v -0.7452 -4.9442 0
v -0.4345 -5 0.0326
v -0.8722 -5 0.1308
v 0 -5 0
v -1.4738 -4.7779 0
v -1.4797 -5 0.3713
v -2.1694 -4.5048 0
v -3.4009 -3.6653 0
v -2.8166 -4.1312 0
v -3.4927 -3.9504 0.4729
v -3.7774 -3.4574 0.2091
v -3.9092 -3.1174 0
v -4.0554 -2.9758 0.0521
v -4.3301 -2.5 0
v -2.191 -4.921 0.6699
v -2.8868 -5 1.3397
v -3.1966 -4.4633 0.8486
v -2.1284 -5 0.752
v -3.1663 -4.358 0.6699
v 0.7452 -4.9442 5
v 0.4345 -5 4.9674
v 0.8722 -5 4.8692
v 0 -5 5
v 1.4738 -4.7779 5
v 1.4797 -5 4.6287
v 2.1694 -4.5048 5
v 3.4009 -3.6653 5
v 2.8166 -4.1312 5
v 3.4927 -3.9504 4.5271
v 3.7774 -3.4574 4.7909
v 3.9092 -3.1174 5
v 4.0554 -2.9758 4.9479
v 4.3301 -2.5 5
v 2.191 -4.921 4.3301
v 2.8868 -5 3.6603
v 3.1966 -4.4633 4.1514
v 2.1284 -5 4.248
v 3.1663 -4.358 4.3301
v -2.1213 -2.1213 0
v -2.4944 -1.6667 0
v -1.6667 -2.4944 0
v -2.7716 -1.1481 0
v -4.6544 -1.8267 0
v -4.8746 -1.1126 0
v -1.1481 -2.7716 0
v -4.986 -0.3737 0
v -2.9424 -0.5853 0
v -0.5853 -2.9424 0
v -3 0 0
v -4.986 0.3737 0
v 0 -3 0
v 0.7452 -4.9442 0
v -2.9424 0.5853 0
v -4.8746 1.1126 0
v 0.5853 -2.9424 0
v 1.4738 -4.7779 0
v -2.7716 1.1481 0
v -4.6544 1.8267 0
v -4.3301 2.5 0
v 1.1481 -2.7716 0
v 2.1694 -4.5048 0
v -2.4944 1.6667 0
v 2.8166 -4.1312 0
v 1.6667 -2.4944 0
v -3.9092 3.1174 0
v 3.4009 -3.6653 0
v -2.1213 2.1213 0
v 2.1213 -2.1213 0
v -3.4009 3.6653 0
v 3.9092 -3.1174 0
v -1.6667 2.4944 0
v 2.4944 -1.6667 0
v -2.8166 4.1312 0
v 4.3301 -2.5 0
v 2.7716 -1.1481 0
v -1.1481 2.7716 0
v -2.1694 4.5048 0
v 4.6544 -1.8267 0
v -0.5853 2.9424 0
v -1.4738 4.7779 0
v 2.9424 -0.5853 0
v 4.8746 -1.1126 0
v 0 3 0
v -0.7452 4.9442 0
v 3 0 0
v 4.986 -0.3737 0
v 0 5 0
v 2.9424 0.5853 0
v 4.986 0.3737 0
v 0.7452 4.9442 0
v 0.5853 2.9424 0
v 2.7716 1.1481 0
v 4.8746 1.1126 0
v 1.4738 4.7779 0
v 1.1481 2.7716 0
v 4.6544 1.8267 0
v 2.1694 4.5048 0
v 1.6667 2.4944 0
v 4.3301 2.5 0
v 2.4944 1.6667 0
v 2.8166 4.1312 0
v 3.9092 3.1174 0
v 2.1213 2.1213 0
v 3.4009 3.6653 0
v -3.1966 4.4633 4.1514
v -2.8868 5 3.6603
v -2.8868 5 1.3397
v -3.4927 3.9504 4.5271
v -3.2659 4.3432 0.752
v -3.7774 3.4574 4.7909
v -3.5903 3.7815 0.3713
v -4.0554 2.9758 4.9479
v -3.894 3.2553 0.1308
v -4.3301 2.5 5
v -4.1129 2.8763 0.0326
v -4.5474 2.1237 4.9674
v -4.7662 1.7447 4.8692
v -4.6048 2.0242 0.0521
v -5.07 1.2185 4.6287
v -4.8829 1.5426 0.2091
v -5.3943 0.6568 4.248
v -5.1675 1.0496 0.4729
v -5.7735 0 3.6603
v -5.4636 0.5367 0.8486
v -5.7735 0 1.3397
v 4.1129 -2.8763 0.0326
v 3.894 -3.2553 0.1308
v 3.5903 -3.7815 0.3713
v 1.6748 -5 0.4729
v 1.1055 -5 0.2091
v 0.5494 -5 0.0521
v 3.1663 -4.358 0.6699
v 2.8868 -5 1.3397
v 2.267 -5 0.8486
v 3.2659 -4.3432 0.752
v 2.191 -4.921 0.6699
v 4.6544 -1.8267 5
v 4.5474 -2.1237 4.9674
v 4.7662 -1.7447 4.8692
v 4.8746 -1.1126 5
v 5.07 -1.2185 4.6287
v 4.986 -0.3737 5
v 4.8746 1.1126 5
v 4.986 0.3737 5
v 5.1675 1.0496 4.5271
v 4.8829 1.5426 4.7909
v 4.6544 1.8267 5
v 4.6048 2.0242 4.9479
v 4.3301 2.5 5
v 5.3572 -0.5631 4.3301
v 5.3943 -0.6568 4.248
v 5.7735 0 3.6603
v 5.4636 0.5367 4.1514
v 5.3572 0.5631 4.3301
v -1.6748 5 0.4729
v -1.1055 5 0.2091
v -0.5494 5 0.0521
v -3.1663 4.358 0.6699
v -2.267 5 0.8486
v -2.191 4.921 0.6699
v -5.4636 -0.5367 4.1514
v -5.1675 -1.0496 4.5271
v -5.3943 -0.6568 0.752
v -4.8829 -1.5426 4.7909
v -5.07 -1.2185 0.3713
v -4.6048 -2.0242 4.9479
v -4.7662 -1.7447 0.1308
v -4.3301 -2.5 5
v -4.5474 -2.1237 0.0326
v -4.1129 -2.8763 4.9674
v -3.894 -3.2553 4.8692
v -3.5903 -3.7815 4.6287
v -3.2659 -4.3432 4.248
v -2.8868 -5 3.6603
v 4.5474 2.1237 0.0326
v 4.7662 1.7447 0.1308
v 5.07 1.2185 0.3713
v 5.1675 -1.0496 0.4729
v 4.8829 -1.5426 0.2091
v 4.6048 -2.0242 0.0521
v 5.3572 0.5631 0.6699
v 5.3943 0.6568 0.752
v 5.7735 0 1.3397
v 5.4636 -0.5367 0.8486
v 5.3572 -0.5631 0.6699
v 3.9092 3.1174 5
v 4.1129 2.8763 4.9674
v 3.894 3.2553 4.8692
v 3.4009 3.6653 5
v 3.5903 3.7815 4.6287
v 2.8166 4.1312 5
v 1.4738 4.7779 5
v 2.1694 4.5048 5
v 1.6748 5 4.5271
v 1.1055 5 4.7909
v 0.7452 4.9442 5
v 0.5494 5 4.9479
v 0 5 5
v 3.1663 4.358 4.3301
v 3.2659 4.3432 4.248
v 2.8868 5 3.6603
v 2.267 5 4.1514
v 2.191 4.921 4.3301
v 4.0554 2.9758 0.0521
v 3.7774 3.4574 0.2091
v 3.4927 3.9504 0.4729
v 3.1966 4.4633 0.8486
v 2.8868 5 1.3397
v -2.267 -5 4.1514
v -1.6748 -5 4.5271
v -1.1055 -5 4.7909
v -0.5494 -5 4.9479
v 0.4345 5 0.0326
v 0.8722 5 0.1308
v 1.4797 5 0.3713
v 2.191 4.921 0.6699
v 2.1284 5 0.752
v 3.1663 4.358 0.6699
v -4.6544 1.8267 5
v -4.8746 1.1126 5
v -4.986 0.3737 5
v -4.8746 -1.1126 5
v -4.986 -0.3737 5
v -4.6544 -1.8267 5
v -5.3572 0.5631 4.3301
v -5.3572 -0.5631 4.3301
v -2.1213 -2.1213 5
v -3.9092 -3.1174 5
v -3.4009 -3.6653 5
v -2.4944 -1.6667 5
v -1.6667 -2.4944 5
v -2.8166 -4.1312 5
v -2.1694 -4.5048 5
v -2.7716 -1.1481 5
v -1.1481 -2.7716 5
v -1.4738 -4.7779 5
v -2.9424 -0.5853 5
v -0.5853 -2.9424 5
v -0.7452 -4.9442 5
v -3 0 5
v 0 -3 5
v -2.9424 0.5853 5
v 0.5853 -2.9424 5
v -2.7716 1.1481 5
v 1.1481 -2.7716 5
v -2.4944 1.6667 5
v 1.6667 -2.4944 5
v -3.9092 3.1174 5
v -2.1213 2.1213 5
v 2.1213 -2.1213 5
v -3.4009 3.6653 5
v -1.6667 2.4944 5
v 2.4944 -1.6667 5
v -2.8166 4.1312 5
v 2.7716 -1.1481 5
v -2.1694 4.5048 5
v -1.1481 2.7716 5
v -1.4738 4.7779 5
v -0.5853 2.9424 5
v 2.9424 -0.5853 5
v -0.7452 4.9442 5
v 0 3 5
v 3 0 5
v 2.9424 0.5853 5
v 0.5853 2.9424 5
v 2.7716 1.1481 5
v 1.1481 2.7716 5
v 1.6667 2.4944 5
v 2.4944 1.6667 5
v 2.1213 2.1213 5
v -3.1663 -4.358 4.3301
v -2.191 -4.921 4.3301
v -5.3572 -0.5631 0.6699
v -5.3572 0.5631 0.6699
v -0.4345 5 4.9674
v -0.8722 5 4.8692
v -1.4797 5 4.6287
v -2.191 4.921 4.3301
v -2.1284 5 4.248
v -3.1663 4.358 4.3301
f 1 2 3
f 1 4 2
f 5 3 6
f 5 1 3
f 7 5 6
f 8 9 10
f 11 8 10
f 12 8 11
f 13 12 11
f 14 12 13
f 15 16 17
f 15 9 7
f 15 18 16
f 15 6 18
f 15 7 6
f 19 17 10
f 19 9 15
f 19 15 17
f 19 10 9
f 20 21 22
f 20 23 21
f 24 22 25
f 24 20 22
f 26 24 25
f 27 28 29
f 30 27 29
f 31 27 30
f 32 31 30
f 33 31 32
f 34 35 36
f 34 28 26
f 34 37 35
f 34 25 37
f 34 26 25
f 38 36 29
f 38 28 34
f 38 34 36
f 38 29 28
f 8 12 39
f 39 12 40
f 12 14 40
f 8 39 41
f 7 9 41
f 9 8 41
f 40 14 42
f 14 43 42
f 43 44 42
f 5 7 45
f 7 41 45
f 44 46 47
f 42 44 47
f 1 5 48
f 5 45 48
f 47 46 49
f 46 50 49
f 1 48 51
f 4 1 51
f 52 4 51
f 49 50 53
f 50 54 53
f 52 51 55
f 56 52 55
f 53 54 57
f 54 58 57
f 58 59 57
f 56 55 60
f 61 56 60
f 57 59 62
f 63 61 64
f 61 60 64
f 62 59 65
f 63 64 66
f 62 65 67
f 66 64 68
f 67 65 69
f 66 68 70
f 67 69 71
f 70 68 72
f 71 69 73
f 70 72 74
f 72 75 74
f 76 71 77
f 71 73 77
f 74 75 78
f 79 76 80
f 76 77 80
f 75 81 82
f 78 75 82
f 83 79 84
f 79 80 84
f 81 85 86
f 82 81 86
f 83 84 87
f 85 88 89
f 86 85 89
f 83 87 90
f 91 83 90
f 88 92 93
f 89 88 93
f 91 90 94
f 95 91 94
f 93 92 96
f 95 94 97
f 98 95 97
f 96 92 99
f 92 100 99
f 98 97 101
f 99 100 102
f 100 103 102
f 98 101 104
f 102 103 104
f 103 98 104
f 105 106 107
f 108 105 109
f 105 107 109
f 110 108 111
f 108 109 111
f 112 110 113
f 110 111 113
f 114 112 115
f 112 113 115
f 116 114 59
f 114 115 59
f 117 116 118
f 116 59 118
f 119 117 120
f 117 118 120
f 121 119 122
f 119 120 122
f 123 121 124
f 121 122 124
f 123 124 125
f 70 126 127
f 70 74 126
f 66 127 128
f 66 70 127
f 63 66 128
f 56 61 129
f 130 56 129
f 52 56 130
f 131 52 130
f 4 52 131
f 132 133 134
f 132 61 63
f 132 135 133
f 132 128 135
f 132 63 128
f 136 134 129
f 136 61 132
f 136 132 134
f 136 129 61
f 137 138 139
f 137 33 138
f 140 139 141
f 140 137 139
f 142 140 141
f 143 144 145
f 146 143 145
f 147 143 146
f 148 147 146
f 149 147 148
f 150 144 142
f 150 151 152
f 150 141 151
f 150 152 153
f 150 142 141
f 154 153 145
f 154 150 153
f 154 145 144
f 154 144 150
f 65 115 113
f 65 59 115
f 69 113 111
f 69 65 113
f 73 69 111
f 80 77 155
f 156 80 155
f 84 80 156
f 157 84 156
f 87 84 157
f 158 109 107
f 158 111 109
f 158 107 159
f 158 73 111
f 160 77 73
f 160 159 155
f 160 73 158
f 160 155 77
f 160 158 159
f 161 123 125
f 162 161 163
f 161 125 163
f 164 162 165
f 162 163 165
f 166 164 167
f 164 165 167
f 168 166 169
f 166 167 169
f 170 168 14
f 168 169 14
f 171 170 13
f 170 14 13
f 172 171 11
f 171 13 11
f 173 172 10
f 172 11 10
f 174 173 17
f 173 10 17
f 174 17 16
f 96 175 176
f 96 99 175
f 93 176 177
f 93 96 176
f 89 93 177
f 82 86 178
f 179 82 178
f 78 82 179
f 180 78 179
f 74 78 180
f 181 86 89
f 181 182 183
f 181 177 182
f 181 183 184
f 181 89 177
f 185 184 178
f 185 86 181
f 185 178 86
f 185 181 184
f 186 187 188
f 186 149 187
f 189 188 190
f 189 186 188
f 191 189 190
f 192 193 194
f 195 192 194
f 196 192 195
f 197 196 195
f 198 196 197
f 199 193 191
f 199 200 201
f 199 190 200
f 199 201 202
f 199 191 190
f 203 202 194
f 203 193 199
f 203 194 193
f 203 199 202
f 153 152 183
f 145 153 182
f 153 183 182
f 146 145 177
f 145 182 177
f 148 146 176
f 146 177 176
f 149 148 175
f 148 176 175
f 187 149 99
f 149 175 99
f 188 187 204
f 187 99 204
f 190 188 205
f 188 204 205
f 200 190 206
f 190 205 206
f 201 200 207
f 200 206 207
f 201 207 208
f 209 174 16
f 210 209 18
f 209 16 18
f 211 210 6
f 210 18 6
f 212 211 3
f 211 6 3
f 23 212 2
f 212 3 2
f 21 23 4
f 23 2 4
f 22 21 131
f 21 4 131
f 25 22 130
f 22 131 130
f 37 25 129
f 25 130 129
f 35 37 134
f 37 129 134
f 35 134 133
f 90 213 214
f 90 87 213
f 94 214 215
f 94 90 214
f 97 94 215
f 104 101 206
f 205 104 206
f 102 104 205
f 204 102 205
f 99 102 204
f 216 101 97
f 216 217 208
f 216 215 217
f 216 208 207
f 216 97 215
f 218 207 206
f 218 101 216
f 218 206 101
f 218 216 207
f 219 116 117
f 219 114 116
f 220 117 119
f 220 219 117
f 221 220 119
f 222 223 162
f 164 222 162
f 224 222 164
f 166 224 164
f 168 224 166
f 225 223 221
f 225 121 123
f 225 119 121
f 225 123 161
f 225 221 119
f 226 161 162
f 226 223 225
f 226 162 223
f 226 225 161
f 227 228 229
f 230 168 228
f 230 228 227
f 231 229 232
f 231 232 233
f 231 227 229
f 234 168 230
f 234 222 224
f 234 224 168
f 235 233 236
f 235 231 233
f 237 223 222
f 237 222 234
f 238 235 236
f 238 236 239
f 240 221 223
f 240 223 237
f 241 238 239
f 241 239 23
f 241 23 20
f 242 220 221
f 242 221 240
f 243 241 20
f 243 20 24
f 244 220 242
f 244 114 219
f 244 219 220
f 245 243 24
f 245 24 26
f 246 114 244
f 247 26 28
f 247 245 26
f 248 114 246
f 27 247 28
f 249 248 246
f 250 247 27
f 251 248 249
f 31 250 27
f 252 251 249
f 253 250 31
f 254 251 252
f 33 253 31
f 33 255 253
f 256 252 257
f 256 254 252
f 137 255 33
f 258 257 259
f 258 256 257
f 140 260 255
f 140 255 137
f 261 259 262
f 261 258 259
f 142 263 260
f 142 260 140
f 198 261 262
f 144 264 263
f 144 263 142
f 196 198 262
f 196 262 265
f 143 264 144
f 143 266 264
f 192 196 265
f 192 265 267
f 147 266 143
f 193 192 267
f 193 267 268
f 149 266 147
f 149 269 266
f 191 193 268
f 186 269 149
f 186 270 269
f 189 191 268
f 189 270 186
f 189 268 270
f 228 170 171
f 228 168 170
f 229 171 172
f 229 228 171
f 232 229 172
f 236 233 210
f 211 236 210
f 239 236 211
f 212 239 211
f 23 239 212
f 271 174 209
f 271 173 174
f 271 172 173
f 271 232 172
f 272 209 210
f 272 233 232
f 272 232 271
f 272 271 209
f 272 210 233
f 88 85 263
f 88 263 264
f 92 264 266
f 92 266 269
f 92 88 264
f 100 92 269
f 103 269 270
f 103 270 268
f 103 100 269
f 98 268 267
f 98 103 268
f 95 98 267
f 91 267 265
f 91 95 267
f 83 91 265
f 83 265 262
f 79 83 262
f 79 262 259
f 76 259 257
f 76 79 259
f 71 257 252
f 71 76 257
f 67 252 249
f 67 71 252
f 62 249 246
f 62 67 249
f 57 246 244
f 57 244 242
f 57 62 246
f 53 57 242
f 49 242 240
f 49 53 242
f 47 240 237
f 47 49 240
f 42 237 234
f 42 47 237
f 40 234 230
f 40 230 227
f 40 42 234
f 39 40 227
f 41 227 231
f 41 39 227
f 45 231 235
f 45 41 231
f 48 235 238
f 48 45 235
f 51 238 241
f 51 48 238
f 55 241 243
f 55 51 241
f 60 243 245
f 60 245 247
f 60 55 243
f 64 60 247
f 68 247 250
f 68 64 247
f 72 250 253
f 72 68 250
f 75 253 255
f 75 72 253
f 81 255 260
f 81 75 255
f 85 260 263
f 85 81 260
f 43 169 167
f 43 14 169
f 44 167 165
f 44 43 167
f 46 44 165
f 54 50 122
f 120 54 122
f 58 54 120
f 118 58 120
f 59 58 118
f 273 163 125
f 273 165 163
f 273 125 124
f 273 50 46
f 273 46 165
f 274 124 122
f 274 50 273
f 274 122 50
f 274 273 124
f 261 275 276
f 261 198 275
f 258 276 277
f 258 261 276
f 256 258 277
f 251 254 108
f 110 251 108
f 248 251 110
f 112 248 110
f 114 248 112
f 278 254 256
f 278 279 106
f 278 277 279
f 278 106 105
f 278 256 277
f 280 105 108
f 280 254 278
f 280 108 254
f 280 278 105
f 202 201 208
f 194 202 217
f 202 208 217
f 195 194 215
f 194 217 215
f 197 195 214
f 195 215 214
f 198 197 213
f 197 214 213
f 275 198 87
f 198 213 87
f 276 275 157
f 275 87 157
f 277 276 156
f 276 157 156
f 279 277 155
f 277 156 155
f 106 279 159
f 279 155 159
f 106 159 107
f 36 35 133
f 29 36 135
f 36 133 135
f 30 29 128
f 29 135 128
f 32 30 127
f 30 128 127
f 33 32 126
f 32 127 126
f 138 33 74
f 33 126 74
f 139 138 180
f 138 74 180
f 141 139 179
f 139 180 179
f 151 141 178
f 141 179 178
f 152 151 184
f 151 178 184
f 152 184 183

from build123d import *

# Parameters (mm, degrees)
CROQUIS1_R              = 3
SALIENTE_EXTRUIR1_DEPTH = 5
CROQUIS2_OUTSIDE_W      = 22.536
CROQUIS2_OUTSIDE_H      = 20.988
CROQUIS2_OUTSIDE_R      = 5
CORTAR_EXTRUIR1_DEPTH   = 5
CORTAR_EXTRUIR1_DRAFT   = -30
CROQUIS3_OUTSIDE_W      = 22.536
CROQUIS3_OUTSIDE_H      = 20.988
CROQUIS3_OUTSIDE_R      = 5
CORTAR_EXTRUIR2_DEPTH   = 5
CORTAR_EXTRUIR2_DRAFT   = -30


with BuildPart() as part:
    # Croquis1 → Saliente-Extruir1 (new body)
    with BuildSketch(Plane.XY):
        Polygon((5.773502692, 0), (2.886751346, 5), (-2.886751346, 5), (-5.773502692, 0), (-2.886751346, -5), (2.886751346, -5), align=None)
        Circle(CROQUIS1_R, mode=Mode.SUBTRACT)
    extrude(amount=SALIENTE_EXTRUIR1_DEPTH)


with BuildPart() as cortar_extruir1_tool:
    # Croquis2 outside → Cortar-Extruir1 (with draft: the straight prism first)
    with BuildSketch(Plane.XY.offset(5)):
        Rectangle(CROQUIS2_OUTSIDE_W, CROQUIS2_OUTSIDE_H)
        Circle(CROQUIS2_OUTSIDE_R, mode=Mode.SUBTRACT)
    extrude(amount=-CORTAR_EXTRUIR1_DEPTH)
    # Cortar-Extruir1: the draft: its side faces are tilted about the plane it starts from
    cortar_extruir1_sides = [cortar_extruir1_tool.faces().sort_by_distance(p)[0] for p in [
        (0, -10.494, 2.5),
        (11.268, 0, 2.5),
        (0, 10.494, 2.5),
        (-11.268, 0, 2.5),
        (-5, 0, 2.5),
    ]]
    draft(cortar_extruir1_sides, Plane.XY.offset(5), CORTAR_EXTRUIR1_DRAFT)


with BuildPart() as part_1:
    add(part.part)

    # Cortar-Extruir1: cut by cortar_extruir1_tool
    add(cortar_extruir1_tool.part, mode=Mode.SUBTRACT)


with BuildPart() as cortar_extruir2_tool:
    # Croquis3 outside → Cortar-Extruir2 (with draft: the straight prism first)
    with BuildSketch(Plane(origin=(0, 0, 0), x_dir=(-1, 0, 0), z_dir=(0, 0, -1))):
        Rectangle(CROQUIS3_OUTSIDE_W, CROQUIS3_OUTSIDE_H)
        Circle(CROQUIS3_OUTSIDE_R, mode=Mode.SUBTRACT)
    extrude(amount=-CORTAR_EXTRUIR2_DEPTH)
    # Cortar-Extruir2: the draft: its side faces are tilted about the plane it starts from
    cortar_extruir2_sides = [cortar_extruir2_tool.faces().sort_by_distance(p)[0] for p in [
        (0, -10.494, 2.5),
        (-11.268, 0, 2.5),
        (0, 10.494, 2.5),
        (11.268, 0, 2.5),
        (5, 0, 2.5),
    ]]
    draft(cortar_extruir2_sides, Plane(origin=(0, 0, 0), x_dir=(-1, 0, 0), z_dir=(0, 0, -1)), CORTAR_EXTRUIR2_DRAFT)


with BuildPart() as part_2:
    add(part_1.part)

    # Cortar-Extruir2: cut by cortar_extruir2_tool
    add(cortar_extruir2_tool.part, mode=Mode.SUBTRACT)


solid = part_2.part
